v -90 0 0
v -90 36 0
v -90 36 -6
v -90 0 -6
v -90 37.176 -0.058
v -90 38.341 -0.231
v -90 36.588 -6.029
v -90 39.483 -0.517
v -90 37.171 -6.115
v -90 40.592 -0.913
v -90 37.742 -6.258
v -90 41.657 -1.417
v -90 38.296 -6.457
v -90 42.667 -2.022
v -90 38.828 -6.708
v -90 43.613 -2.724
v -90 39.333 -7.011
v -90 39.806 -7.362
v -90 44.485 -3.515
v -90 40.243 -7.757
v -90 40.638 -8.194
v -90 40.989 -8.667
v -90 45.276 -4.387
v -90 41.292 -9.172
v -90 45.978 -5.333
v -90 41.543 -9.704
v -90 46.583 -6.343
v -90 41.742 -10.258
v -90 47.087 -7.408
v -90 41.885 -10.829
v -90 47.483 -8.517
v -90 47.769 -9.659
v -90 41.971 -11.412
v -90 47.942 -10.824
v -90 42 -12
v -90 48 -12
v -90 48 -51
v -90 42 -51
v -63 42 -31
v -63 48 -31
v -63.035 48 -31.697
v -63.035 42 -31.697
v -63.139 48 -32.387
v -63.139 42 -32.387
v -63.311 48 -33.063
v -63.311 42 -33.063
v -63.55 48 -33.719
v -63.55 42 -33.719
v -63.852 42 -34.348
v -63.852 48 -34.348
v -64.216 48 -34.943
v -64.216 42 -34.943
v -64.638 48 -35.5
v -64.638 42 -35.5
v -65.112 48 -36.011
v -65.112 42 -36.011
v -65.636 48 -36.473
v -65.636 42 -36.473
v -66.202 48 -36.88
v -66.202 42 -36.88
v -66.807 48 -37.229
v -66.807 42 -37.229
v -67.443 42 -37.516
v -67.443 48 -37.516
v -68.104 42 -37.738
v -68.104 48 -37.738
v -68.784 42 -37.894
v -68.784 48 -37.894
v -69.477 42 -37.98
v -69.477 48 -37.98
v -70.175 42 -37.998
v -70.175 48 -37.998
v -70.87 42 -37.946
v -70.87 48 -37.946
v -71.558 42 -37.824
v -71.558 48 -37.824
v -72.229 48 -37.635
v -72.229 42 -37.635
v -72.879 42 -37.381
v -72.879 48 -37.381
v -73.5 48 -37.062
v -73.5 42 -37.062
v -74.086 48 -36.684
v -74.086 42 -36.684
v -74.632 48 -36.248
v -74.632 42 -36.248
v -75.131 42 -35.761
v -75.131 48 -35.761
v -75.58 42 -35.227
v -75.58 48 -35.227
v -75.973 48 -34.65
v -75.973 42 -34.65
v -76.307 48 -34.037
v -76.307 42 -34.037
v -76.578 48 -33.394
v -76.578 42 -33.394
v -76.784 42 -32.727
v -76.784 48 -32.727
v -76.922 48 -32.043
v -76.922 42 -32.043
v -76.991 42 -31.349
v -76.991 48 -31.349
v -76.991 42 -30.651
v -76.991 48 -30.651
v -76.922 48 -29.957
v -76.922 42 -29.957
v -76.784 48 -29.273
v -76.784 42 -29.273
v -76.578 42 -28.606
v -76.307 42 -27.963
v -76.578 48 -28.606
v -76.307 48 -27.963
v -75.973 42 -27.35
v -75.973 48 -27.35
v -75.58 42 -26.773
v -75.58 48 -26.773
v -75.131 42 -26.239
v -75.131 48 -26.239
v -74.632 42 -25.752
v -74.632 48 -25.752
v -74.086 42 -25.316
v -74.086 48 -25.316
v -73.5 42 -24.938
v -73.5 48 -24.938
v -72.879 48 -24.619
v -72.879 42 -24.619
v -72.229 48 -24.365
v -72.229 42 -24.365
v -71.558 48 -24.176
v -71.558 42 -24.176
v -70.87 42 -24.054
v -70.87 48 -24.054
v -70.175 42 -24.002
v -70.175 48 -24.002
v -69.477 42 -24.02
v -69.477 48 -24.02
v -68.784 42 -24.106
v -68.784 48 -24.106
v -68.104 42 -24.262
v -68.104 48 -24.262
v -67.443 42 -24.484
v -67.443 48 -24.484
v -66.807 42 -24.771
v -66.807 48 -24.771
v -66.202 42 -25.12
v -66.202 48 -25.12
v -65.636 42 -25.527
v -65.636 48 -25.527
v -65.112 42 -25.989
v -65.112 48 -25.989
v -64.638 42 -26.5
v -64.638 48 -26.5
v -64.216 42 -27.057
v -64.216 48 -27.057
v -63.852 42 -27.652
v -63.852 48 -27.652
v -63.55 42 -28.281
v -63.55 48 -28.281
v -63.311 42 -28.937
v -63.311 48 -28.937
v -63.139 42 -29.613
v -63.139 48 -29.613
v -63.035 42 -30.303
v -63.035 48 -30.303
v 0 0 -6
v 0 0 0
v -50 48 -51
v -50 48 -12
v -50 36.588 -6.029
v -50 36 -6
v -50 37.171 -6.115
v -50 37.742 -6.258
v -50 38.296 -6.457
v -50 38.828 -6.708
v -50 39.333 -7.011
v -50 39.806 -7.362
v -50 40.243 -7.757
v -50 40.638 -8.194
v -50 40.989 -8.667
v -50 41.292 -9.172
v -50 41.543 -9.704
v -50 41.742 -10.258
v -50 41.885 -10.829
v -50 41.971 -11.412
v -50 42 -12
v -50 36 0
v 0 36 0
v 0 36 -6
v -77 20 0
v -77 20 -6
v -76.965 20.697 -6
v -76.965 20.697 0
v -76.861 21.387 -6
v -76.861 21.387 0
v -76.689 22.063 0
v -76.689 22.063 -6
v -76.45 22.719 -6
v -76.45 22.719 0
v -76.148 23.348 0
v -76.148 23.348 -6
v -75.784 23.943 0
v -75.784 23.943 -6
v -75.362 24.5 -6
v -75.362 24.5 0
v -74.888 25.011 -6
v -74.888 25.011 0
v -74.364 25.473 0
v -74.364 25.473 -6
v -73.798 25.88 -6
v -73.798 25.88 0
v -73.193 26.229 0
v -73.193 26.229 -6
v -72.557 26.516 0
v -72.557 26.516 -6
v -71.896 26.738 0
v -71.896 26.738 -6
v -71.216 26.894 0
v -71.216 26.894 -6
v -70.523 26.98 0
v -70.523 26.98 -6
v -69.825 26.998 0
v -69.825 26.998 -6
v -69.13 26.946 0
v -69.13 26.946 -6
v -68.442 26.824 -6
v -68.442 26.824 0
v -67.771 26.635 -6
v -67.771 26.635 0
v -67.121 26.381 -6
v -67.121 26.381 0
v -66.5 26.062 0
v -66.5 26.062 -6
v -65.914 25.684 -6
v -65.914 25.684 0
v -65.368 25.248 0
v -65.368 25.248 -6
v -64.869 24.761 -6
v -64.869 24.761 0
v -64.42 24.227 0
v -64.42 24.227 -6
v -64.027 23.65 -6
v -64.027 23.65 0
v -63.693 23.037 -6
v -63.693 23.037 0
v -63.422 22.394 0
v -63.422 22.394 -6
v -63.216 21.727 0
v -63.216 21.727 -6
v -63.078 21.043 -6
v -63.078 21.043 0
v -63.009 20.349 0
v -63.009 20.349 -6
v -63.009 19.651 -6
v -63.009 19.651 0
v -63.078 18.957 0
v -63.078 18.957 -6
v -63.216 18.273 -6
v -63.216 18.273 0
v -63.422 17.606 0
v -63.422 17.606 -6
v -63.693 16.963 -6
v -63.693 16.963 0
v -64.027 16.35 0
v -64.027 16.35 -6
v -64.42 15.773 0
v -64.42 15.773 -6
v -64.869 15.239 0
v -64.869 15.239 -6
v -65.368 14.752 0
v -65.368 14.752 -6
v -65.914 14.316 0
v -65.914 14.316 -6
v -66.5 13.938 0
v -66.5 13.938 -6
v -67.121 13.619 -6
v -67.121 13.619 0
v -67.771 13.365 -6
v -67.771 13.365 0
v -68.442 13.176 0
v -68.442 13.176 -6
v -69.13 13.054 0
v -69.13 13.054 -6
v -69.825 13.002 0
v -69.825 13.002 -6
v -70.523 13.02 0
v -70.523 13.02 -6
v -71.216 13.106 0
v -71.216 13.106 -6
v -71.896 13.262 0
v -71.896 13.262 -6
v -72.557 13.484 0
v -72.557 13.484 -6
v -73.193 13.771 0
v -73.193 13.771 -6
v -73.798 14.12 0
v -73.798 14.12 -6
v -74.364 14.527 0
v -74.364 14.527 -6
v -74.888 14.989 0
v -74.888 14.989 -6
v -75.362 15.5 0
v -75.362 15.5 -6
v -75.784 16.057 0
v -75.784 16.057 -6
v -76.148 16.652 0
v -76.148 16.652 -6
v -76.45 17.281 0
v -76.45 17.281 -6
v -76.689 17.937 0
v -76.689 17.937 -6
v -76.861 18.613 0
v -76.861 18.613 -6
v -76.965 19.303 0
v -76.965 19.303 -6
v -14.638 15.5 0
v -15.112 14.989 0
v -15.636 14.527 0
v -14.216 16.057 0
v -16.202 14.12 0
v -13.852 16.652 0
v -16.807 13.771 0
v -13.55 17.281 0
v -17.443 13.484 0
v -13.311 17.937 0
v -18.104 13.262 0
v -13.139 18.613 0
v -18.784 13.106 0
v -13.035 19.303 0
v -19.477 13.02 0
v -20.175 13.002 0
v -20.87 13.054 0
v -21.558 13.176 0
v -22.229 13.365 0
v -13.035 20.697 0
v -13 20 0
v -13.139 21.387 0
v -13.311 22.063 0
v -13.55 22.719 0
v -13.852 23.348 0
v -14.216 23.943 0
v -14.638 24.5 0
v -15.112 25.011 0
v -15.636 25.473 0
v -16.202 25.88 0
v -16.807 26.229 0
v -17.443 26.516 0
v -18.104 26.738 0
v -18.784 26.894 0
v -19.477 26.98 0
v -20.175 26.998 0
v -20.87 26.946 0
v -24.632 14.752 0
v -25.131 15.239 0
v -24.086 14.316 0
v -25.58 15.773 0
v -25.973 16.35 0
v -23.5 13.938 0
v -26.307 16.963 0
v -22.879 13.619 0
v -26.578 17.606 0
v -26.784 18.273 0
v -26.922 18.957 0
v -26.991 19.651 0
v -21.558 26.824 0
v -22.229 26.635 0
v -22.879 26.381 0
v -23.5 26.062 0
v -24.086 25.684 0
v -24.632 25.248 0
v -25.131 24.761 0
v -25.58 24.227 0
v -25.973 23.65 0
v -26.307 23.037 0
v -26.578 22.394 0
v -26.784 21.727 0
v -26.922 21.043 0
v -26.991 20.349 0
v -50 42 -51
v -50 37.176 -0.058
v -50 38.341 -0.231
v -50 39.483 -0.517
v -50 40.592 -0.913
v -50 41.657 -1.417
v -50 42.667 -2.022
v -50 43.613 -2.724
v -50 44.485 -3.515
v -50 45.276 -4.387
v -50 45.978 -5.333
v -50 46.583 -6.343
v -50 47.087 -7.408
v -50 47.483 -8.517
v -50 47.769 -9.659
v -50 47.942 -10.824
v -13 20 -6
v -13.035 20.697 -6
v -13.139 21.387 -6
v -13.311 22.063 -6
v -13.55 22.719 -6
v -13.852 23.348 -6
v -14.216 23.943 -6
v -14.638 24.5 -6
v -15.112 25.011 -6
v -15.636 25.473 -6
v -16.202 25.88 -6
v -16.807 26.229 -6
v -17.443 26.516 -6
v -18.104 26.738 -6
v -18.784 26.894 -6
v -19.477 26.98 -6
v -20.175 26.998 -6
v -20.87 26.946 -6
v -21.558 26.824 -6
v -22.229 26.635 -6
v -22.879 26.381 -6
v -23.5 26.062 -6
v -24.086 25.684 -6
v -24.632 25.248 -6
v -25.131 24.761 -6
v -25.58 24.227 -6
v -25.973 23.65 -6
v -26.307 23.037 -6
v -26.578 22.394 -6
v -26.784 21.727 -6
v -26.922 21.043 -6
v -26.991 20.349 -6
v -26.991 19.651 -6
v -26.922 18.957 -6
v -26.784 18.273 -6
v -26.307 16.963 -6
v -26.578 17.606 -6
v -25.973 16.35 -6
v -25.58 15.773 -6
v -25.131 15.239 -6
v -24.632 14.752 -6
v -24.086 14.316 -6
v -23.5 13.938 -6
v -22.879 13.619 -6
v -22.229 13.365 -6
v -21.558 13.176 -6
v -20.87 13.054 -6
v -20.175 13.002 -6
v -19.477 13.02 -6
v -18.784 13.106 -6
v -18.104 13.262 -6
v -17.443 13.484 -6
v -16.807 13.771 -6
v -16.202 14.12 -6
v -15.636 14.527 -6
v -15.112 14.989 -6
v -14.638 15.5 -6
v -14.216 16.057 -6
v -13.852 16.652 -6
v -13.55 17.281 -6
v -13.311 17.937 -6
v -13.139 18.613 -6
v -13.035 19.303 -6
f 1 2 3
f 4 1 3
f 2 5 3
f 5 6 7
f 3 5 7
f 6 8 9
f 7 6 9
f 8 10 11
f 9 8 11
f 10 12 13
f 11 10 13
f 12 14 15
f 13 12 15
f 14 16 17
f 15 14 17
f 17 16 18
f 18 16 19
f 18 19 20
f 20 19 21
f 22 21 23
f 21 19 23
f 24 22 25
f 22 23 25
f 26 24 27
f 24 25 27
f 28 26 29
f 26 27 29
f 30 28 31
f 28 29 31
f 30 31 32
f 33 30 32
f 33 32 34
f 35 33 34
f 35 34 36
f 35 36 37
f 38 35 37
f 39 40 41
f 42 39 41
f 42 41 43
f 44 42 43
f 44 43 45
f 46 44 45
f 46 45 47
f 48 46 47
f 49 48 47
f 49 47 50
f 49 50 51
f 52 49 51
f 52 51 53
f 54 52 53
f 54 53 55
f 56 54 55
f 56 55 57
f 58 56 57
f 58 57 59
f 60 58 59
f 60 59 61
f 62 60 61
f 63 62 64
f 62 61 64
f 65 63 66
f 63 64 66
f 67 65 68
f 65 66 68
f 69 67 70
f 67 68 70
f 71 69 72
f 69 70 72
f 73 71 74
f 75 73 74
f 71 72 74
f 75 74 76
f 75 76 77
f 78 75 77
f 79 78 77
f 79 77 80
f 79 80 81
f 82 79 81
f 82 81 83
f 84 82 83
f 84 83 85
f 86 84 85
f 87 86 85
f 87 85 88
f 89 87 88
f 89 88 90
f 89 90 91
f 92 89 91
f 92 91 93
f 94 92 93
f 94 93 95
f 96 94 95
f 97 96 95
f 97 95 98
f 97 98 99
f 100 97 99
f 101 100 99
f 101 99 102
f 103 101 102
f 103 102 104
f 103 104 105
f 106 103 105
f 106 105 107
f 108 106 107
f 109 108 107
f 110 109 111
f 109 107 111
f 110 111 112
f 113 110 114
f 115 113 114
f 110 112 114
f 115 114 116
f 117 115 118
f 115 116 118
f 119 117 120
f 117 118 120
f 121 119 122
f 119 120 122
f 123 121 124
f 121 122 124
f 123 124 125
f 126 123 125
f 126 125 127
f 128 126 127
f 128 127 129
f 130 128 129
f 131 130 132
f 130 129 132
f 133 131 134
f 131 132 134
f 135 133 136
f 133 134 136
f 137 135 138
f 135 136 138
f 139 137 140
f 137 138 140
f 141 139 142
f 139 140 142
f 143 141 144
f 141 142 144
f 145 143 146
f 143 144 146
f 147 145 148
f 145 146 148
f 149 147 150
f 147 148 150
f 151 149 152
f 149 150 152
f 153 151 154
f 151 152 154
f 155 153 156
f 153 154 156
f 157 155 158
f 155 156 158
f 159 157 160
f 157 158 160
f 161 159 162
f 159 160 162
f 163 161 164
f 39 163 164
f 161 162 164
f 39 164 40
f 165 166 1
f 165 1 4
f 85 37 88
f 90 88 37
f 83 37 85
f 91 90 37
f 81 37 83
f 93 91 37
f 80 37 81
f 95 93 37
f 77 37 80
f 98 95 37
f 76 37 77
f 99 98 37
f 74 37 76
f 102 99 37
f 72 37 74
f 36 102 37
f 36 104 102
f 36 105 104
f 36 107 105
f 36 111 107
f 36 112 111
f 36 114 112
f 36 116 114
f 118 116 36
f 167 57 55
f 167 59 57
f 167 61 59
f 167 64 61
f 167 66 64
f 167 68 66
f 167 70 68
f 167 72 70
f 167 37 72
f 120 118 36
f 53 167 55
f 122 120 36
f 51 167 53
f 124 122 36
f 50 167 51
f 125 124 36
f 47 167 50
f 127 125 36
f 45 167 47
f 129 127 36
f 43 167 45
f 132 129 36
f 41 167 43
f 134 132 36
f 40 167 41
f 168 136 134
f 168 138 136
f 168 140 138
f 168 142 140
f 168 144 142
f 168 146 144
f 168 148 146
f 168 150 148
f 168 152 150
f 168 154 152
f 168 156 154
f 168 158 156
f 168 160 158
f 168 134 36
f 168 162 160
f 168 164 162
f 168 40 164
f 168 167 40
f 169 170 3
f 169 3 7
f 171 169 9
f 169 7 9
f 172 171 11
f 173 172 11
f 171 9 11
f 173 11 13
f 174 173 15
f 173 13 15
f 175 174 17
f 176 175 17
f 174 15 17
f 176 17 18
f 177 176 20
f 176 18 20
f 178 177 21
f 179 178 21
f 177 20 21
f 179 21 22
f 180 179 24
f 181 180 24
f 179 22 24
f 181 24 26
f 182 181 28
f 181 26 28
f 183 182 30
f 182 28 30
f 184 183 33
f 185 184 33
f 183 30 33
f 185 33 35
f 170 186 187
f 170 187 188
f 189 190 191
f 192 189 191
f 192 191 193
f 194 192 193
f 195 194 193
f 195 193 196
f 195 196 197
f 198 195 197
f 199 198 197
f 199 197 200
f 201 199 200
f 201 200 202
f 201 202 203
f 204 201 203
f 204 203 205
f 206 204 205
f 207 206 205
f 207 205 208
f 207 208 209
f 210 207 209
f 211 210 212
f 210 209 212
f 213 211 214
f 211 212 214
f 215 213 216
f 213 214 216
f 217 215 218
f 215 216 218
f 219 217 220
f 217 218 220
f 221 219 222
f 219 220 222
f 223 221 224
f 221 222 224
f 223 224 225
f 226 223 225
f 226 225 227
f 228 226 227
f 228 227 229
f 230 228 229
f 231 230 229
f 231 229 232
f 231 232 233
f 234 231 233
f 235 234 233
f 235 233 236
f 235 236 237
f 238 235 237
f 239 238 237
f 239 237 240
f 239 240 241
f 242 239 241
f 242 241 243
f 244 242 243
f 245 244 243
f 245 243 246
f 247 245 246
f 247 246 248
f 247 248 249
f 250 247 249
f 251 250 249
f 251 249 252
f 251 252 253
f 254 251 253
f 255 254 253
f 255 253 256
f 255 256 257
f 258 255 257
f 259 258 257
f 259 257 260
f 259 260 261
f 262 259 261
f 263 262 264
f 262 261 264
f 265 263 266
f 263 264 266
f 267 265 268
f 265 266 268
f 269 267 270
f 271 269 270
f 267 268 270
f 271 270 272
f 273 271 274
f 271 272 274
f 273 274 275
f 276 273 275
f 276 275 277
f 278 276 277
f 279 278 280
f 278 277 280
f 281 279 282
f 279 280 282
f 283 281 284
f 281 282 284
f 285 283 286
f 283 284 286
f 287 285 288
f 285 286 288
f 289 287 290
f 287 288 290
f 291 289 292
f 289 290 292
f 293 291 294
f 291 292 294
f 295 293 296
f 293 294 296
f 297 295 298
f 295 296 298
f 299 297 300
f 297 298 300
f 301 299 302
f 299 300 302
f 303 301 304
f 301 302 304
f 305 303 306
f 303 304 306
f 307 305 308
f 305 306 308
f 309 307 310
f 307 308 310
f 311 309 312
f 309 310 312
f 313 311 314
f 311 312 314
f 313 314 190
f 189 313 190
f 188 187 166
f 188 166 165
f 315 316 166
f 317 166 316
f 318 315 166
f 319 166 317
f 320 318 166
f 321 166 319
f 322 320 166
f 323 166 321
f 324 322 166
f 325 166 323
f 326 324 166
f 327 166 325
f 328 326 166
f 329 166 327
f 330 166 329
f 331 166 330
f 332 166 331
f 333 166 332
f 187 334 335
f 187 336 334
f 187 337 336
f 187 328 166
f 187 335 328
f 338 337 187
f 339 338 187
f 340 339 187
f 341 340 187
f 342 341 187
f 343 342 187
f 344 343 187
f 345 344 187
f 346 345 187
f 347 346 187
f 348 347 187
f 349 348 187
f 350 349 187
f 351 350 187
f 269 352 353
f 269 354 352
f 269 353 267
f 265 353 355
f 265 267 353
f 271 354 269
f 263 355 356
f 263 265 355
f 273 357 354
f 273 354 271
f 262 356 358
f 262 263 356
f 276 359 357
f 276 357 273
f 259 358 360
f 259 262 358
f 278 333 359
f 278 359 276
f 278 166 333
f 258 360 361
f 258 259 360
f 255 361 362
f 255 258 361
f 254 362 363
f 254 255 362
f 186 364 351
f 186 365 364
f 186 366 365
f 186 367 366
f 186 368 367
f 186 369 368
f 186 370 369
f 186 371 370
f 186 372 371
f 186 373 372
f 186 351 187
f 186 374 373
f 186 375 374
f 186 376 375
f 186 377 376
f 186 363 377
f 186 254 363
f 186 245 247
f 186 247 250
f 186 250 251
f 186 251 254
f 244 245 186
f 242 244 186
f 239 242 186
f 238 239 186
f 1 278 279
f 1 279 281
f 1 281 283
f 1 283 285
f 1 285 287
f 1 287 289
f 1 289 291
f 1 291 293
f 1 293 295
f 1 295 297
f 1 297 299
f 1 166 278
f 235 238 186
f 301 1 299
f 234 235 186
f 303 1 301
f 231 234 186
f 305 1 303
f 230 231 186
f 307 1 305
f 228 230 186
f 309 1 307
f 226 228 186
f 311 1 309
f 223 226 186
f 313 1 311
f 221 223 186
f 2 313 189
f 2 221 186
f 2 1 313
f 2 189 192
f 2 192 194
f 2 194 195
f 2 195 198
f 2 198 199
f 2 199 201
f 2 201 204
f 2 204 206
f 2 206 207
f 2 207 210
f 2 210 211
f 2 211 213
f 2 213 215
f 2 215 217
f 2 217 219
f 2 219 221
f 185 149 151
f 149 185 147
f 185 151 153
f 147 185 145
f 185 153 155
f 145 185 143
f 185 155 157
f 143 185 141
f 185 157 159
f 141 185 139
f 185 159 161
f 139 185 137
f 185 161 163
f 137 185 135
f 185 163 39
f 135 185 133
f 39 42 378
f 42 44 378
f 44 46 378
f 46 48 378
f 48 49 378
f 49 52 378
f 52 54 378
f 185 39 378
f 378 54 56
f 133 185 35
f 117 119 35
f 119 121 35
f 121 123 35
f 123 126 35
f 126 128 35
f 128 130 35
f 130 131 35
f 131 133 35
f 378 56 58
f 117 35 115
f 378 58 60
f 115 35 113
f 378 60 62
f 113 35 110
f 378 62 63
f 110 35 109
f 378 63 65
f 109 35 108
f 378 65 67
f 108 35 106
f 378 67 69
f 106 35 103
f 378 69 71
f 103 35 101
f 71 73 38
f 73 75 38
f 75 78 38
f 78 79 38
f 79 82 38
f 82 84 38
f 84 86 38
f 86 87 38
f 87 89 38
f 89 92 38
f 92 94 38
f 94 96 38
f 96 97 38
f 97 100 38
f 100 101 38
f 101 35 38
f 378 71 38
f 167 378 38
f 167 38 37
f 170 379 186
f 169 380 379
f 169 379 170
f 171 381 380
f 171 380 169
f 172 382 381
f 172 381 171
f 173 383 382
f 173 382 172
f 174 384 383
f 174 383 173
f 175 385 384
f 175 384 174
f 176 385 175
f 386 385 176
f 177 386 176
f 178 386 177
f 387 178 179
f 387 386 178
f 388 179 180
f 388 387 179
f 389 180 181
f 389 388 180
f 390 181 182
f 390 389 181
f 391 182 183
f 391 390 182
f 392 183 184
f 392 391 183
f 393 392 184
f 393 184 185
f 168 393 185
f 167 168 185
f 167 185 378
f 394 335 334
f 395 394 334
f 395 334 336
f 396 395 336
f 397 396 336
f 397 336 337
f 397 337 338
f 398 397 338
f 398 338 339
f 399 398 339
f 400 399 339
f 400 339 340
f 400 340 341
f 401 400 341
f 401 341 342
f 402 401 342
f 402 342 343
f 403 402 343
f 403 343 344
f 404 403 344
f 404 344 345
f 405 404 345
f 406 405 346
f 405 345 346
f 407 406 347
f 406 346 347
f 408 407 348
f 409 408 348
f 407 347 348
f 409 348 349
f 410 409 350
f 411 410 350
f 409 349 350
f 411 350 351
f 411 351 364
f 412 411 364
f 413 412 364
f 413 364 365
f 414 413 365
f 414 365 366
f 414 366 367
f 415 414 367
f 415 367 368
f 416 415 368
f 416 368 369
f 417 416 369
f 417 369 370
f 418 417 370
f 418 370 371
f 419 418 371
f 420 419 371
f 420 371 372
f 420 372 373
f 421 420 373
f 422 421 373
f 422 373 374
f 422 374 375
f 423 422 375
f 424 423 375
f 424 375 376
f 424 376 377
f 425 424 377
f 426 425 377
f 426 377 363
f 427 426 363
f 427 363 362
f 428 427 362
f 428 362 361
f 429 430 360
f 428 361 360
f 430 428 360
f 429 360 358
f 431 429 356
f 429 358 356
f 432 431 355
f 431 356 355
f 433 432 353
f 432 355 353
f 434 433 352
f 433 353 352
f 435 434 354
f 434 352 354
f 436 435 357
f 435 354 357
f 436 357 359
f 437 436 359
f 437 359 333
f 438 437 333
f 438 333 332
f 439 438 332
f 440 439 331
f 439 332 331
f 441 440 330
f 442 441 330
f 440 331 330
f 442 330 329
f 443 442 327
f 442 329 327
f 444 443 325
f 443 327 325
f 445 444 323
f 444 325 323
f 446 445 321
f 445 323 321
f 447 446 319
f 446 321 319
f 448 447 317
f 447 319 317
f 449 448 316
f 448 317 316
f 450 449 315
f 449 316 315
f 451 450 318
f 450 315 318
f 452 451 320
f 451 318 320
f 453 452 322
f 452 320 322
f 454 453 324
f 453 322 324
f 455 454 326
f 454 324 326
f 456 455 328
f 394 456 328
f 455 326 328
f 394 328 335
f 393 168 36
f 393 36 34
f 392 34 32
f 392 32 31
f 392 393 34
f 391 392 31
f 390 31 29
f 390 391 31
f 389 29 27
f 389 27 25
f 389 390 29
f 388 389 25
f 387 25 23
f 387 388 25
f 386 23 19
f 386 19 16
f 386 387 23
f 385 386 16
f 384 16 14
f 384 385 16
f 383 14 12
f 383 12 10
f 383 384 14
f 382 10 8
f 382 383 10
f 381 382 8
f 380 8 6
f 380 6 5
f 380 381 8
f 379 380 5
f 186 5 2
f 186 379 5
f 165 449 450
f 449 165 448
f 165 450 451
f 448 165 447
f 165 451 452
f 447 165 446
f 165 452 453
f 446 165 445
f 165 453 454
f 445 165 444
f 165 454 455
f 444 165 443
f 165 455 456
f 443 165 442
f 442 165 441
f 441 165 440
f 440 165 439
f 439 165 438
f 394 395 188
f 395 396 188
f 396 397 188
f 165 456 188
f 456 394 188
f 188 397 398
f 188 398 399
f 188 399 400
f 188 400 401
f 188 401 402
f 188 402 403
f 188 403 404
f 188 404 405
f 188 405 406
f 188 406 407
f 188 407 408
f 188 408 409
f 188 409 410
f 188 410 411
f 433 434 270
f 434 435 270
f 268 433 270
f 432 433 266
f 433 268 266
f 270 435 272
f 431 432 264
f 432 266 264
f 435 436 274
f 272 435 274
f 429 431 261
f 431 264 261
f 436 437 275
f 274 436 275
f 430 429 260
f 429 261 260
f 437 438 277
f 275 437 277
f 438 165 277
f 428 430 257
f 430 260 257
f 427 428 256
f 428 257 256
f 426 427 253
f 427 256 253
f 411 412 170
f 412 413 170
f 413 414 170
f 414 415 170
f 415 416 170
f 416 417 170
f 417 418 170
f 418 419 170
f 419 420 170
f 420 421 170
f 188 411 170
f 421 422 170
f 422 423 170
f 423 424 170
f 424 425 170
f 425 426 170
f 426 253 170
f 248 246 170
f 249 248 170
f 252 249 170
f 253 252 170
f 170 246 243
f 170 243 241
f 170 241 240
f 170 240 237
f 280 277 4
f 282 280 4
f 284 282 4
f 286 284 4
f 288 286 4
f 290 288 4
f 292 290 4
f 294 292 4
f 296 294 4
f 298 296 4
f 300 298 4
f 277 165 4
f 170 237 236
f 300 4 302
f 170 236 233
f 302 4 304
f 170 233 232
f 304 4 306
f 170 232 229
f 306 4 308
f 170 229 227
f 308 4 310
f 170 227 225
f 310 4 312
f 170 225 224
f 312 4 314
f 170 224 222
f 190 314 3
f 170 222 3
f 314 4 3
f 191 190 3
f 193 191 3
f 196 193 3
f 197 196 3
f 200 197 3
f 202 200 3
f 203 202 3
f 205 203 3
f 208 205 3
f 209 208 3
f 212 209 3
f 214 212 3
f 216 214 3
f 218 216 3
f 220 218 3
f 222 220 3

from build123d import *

# Parameters (mm, degrees)
BOSS_EXTRUDE1_DEPTH            = 40
CUT_EXTRUDE1_DEPTH             = 41
SKETCH3_W                      = 6
SKETCH3_H                      = 36
BOSS_EXTRUDE2_DEPTH            = 50
F_14_0_14_DIAMETER_HOLE1_D     = 14
F_14_0_14_DIAMETER_HOLE1_DEPTH = 51
F_14_0_14_DIAMETER_HOLE2_D     = 14
F_14_0_14_DIAMETER_HOLE2_DEPTH = 6
F_14_0_14_DIAMETER_HOLE3_D     = 14
F_14_0_14_DIAMETER_HOLE3_DEPTH = 6


with BuildPart() as part:
    # Sketch1 → Boss-Extrude1 (new body)
    with BuildSketch(Plane(origin=(-50, 0, 0), x_dir=(0, 0, -1), z_dir=(1, 0, 0))):
        with BuildLine():
            Line((0, 0), (51, 0))
            Line((51, 0), (51, 48))
            Line((51, 48), (12, 48))
            ThreePointArc((12, 48), (3.514718626, 44.485281374), (0, 36))
            Line((0, 36), (0, 0))
        make_face()
    extrude(amount=-BOSS_EXTRUDE1_DEPTH)

    # Sketch2 → Cut-Extrude1 (cut, through all)
    with BuildSketch(Plane.ZY.offset(90)):
        with BuildLine():
            Line((-51, 0), (-6, 0))
            Line((-6, 0), (-6, 36))
            ThreePointArc((-6, 36), (-7.757359313, 40.242640687), (-12, 42))
            Line((-12, 42), (-51, 42))
            Line((-51, 42), (-51, 0))
        make_face()
    extrude(amount=-CUT_EXTRUDE1_DEPTH, mode=Mode.SUBTRACT)

    # Sketch3 → Boss-Extrude2 (add)
    with BuildSketch(Plane(origin=(-50, 0, 0), x_dir=(0, 0, -1), z_dir=(1, 0, 0))):
        with Locations((3, 18)):
            Rectangle(SKETCH3_W, SKETCH3_H)
    extrude(amount=BOSS_EXTRUDE2_DEPTH)

    # Ø14.0 (14) Diameter Hole1
    with Locations(Plane.XY):
        with Locations((-70, 20)):
            Hole(F_14_0_14_DIAMETER_HOLE1_D / 2, depth=F_14_0_14_DIAMETER_HOLE1_DEPTH)

    # Ø14.0 (14) Diameter Hole2
    with Locations(Plane(origin=(0, 0, -6), x_dir=(-1, 0, 0), z_dir=(0, 0, -1))):
        with Locations((20, 20)):
            Hole(F_14_0_14_DIAMETER_HOLE2_D / 2, depth=F_14_0_14_DIAMETER_HOLE2_DEPTH)

    # Ø14.0 (14) Diameter Hole3
    with Locations(Plane(origin=(0, 42, 0), x_dir=(-1, 0, 0), z_dir=(0, -1, 0))):
        with Locations((70, 31)):
            Hole(F_14_0_14_DIAMETER_HOLE3_D / 2, depth=F_14_0_14_DIAMETER_HOLE3_DEPTH)


solid = part.part
